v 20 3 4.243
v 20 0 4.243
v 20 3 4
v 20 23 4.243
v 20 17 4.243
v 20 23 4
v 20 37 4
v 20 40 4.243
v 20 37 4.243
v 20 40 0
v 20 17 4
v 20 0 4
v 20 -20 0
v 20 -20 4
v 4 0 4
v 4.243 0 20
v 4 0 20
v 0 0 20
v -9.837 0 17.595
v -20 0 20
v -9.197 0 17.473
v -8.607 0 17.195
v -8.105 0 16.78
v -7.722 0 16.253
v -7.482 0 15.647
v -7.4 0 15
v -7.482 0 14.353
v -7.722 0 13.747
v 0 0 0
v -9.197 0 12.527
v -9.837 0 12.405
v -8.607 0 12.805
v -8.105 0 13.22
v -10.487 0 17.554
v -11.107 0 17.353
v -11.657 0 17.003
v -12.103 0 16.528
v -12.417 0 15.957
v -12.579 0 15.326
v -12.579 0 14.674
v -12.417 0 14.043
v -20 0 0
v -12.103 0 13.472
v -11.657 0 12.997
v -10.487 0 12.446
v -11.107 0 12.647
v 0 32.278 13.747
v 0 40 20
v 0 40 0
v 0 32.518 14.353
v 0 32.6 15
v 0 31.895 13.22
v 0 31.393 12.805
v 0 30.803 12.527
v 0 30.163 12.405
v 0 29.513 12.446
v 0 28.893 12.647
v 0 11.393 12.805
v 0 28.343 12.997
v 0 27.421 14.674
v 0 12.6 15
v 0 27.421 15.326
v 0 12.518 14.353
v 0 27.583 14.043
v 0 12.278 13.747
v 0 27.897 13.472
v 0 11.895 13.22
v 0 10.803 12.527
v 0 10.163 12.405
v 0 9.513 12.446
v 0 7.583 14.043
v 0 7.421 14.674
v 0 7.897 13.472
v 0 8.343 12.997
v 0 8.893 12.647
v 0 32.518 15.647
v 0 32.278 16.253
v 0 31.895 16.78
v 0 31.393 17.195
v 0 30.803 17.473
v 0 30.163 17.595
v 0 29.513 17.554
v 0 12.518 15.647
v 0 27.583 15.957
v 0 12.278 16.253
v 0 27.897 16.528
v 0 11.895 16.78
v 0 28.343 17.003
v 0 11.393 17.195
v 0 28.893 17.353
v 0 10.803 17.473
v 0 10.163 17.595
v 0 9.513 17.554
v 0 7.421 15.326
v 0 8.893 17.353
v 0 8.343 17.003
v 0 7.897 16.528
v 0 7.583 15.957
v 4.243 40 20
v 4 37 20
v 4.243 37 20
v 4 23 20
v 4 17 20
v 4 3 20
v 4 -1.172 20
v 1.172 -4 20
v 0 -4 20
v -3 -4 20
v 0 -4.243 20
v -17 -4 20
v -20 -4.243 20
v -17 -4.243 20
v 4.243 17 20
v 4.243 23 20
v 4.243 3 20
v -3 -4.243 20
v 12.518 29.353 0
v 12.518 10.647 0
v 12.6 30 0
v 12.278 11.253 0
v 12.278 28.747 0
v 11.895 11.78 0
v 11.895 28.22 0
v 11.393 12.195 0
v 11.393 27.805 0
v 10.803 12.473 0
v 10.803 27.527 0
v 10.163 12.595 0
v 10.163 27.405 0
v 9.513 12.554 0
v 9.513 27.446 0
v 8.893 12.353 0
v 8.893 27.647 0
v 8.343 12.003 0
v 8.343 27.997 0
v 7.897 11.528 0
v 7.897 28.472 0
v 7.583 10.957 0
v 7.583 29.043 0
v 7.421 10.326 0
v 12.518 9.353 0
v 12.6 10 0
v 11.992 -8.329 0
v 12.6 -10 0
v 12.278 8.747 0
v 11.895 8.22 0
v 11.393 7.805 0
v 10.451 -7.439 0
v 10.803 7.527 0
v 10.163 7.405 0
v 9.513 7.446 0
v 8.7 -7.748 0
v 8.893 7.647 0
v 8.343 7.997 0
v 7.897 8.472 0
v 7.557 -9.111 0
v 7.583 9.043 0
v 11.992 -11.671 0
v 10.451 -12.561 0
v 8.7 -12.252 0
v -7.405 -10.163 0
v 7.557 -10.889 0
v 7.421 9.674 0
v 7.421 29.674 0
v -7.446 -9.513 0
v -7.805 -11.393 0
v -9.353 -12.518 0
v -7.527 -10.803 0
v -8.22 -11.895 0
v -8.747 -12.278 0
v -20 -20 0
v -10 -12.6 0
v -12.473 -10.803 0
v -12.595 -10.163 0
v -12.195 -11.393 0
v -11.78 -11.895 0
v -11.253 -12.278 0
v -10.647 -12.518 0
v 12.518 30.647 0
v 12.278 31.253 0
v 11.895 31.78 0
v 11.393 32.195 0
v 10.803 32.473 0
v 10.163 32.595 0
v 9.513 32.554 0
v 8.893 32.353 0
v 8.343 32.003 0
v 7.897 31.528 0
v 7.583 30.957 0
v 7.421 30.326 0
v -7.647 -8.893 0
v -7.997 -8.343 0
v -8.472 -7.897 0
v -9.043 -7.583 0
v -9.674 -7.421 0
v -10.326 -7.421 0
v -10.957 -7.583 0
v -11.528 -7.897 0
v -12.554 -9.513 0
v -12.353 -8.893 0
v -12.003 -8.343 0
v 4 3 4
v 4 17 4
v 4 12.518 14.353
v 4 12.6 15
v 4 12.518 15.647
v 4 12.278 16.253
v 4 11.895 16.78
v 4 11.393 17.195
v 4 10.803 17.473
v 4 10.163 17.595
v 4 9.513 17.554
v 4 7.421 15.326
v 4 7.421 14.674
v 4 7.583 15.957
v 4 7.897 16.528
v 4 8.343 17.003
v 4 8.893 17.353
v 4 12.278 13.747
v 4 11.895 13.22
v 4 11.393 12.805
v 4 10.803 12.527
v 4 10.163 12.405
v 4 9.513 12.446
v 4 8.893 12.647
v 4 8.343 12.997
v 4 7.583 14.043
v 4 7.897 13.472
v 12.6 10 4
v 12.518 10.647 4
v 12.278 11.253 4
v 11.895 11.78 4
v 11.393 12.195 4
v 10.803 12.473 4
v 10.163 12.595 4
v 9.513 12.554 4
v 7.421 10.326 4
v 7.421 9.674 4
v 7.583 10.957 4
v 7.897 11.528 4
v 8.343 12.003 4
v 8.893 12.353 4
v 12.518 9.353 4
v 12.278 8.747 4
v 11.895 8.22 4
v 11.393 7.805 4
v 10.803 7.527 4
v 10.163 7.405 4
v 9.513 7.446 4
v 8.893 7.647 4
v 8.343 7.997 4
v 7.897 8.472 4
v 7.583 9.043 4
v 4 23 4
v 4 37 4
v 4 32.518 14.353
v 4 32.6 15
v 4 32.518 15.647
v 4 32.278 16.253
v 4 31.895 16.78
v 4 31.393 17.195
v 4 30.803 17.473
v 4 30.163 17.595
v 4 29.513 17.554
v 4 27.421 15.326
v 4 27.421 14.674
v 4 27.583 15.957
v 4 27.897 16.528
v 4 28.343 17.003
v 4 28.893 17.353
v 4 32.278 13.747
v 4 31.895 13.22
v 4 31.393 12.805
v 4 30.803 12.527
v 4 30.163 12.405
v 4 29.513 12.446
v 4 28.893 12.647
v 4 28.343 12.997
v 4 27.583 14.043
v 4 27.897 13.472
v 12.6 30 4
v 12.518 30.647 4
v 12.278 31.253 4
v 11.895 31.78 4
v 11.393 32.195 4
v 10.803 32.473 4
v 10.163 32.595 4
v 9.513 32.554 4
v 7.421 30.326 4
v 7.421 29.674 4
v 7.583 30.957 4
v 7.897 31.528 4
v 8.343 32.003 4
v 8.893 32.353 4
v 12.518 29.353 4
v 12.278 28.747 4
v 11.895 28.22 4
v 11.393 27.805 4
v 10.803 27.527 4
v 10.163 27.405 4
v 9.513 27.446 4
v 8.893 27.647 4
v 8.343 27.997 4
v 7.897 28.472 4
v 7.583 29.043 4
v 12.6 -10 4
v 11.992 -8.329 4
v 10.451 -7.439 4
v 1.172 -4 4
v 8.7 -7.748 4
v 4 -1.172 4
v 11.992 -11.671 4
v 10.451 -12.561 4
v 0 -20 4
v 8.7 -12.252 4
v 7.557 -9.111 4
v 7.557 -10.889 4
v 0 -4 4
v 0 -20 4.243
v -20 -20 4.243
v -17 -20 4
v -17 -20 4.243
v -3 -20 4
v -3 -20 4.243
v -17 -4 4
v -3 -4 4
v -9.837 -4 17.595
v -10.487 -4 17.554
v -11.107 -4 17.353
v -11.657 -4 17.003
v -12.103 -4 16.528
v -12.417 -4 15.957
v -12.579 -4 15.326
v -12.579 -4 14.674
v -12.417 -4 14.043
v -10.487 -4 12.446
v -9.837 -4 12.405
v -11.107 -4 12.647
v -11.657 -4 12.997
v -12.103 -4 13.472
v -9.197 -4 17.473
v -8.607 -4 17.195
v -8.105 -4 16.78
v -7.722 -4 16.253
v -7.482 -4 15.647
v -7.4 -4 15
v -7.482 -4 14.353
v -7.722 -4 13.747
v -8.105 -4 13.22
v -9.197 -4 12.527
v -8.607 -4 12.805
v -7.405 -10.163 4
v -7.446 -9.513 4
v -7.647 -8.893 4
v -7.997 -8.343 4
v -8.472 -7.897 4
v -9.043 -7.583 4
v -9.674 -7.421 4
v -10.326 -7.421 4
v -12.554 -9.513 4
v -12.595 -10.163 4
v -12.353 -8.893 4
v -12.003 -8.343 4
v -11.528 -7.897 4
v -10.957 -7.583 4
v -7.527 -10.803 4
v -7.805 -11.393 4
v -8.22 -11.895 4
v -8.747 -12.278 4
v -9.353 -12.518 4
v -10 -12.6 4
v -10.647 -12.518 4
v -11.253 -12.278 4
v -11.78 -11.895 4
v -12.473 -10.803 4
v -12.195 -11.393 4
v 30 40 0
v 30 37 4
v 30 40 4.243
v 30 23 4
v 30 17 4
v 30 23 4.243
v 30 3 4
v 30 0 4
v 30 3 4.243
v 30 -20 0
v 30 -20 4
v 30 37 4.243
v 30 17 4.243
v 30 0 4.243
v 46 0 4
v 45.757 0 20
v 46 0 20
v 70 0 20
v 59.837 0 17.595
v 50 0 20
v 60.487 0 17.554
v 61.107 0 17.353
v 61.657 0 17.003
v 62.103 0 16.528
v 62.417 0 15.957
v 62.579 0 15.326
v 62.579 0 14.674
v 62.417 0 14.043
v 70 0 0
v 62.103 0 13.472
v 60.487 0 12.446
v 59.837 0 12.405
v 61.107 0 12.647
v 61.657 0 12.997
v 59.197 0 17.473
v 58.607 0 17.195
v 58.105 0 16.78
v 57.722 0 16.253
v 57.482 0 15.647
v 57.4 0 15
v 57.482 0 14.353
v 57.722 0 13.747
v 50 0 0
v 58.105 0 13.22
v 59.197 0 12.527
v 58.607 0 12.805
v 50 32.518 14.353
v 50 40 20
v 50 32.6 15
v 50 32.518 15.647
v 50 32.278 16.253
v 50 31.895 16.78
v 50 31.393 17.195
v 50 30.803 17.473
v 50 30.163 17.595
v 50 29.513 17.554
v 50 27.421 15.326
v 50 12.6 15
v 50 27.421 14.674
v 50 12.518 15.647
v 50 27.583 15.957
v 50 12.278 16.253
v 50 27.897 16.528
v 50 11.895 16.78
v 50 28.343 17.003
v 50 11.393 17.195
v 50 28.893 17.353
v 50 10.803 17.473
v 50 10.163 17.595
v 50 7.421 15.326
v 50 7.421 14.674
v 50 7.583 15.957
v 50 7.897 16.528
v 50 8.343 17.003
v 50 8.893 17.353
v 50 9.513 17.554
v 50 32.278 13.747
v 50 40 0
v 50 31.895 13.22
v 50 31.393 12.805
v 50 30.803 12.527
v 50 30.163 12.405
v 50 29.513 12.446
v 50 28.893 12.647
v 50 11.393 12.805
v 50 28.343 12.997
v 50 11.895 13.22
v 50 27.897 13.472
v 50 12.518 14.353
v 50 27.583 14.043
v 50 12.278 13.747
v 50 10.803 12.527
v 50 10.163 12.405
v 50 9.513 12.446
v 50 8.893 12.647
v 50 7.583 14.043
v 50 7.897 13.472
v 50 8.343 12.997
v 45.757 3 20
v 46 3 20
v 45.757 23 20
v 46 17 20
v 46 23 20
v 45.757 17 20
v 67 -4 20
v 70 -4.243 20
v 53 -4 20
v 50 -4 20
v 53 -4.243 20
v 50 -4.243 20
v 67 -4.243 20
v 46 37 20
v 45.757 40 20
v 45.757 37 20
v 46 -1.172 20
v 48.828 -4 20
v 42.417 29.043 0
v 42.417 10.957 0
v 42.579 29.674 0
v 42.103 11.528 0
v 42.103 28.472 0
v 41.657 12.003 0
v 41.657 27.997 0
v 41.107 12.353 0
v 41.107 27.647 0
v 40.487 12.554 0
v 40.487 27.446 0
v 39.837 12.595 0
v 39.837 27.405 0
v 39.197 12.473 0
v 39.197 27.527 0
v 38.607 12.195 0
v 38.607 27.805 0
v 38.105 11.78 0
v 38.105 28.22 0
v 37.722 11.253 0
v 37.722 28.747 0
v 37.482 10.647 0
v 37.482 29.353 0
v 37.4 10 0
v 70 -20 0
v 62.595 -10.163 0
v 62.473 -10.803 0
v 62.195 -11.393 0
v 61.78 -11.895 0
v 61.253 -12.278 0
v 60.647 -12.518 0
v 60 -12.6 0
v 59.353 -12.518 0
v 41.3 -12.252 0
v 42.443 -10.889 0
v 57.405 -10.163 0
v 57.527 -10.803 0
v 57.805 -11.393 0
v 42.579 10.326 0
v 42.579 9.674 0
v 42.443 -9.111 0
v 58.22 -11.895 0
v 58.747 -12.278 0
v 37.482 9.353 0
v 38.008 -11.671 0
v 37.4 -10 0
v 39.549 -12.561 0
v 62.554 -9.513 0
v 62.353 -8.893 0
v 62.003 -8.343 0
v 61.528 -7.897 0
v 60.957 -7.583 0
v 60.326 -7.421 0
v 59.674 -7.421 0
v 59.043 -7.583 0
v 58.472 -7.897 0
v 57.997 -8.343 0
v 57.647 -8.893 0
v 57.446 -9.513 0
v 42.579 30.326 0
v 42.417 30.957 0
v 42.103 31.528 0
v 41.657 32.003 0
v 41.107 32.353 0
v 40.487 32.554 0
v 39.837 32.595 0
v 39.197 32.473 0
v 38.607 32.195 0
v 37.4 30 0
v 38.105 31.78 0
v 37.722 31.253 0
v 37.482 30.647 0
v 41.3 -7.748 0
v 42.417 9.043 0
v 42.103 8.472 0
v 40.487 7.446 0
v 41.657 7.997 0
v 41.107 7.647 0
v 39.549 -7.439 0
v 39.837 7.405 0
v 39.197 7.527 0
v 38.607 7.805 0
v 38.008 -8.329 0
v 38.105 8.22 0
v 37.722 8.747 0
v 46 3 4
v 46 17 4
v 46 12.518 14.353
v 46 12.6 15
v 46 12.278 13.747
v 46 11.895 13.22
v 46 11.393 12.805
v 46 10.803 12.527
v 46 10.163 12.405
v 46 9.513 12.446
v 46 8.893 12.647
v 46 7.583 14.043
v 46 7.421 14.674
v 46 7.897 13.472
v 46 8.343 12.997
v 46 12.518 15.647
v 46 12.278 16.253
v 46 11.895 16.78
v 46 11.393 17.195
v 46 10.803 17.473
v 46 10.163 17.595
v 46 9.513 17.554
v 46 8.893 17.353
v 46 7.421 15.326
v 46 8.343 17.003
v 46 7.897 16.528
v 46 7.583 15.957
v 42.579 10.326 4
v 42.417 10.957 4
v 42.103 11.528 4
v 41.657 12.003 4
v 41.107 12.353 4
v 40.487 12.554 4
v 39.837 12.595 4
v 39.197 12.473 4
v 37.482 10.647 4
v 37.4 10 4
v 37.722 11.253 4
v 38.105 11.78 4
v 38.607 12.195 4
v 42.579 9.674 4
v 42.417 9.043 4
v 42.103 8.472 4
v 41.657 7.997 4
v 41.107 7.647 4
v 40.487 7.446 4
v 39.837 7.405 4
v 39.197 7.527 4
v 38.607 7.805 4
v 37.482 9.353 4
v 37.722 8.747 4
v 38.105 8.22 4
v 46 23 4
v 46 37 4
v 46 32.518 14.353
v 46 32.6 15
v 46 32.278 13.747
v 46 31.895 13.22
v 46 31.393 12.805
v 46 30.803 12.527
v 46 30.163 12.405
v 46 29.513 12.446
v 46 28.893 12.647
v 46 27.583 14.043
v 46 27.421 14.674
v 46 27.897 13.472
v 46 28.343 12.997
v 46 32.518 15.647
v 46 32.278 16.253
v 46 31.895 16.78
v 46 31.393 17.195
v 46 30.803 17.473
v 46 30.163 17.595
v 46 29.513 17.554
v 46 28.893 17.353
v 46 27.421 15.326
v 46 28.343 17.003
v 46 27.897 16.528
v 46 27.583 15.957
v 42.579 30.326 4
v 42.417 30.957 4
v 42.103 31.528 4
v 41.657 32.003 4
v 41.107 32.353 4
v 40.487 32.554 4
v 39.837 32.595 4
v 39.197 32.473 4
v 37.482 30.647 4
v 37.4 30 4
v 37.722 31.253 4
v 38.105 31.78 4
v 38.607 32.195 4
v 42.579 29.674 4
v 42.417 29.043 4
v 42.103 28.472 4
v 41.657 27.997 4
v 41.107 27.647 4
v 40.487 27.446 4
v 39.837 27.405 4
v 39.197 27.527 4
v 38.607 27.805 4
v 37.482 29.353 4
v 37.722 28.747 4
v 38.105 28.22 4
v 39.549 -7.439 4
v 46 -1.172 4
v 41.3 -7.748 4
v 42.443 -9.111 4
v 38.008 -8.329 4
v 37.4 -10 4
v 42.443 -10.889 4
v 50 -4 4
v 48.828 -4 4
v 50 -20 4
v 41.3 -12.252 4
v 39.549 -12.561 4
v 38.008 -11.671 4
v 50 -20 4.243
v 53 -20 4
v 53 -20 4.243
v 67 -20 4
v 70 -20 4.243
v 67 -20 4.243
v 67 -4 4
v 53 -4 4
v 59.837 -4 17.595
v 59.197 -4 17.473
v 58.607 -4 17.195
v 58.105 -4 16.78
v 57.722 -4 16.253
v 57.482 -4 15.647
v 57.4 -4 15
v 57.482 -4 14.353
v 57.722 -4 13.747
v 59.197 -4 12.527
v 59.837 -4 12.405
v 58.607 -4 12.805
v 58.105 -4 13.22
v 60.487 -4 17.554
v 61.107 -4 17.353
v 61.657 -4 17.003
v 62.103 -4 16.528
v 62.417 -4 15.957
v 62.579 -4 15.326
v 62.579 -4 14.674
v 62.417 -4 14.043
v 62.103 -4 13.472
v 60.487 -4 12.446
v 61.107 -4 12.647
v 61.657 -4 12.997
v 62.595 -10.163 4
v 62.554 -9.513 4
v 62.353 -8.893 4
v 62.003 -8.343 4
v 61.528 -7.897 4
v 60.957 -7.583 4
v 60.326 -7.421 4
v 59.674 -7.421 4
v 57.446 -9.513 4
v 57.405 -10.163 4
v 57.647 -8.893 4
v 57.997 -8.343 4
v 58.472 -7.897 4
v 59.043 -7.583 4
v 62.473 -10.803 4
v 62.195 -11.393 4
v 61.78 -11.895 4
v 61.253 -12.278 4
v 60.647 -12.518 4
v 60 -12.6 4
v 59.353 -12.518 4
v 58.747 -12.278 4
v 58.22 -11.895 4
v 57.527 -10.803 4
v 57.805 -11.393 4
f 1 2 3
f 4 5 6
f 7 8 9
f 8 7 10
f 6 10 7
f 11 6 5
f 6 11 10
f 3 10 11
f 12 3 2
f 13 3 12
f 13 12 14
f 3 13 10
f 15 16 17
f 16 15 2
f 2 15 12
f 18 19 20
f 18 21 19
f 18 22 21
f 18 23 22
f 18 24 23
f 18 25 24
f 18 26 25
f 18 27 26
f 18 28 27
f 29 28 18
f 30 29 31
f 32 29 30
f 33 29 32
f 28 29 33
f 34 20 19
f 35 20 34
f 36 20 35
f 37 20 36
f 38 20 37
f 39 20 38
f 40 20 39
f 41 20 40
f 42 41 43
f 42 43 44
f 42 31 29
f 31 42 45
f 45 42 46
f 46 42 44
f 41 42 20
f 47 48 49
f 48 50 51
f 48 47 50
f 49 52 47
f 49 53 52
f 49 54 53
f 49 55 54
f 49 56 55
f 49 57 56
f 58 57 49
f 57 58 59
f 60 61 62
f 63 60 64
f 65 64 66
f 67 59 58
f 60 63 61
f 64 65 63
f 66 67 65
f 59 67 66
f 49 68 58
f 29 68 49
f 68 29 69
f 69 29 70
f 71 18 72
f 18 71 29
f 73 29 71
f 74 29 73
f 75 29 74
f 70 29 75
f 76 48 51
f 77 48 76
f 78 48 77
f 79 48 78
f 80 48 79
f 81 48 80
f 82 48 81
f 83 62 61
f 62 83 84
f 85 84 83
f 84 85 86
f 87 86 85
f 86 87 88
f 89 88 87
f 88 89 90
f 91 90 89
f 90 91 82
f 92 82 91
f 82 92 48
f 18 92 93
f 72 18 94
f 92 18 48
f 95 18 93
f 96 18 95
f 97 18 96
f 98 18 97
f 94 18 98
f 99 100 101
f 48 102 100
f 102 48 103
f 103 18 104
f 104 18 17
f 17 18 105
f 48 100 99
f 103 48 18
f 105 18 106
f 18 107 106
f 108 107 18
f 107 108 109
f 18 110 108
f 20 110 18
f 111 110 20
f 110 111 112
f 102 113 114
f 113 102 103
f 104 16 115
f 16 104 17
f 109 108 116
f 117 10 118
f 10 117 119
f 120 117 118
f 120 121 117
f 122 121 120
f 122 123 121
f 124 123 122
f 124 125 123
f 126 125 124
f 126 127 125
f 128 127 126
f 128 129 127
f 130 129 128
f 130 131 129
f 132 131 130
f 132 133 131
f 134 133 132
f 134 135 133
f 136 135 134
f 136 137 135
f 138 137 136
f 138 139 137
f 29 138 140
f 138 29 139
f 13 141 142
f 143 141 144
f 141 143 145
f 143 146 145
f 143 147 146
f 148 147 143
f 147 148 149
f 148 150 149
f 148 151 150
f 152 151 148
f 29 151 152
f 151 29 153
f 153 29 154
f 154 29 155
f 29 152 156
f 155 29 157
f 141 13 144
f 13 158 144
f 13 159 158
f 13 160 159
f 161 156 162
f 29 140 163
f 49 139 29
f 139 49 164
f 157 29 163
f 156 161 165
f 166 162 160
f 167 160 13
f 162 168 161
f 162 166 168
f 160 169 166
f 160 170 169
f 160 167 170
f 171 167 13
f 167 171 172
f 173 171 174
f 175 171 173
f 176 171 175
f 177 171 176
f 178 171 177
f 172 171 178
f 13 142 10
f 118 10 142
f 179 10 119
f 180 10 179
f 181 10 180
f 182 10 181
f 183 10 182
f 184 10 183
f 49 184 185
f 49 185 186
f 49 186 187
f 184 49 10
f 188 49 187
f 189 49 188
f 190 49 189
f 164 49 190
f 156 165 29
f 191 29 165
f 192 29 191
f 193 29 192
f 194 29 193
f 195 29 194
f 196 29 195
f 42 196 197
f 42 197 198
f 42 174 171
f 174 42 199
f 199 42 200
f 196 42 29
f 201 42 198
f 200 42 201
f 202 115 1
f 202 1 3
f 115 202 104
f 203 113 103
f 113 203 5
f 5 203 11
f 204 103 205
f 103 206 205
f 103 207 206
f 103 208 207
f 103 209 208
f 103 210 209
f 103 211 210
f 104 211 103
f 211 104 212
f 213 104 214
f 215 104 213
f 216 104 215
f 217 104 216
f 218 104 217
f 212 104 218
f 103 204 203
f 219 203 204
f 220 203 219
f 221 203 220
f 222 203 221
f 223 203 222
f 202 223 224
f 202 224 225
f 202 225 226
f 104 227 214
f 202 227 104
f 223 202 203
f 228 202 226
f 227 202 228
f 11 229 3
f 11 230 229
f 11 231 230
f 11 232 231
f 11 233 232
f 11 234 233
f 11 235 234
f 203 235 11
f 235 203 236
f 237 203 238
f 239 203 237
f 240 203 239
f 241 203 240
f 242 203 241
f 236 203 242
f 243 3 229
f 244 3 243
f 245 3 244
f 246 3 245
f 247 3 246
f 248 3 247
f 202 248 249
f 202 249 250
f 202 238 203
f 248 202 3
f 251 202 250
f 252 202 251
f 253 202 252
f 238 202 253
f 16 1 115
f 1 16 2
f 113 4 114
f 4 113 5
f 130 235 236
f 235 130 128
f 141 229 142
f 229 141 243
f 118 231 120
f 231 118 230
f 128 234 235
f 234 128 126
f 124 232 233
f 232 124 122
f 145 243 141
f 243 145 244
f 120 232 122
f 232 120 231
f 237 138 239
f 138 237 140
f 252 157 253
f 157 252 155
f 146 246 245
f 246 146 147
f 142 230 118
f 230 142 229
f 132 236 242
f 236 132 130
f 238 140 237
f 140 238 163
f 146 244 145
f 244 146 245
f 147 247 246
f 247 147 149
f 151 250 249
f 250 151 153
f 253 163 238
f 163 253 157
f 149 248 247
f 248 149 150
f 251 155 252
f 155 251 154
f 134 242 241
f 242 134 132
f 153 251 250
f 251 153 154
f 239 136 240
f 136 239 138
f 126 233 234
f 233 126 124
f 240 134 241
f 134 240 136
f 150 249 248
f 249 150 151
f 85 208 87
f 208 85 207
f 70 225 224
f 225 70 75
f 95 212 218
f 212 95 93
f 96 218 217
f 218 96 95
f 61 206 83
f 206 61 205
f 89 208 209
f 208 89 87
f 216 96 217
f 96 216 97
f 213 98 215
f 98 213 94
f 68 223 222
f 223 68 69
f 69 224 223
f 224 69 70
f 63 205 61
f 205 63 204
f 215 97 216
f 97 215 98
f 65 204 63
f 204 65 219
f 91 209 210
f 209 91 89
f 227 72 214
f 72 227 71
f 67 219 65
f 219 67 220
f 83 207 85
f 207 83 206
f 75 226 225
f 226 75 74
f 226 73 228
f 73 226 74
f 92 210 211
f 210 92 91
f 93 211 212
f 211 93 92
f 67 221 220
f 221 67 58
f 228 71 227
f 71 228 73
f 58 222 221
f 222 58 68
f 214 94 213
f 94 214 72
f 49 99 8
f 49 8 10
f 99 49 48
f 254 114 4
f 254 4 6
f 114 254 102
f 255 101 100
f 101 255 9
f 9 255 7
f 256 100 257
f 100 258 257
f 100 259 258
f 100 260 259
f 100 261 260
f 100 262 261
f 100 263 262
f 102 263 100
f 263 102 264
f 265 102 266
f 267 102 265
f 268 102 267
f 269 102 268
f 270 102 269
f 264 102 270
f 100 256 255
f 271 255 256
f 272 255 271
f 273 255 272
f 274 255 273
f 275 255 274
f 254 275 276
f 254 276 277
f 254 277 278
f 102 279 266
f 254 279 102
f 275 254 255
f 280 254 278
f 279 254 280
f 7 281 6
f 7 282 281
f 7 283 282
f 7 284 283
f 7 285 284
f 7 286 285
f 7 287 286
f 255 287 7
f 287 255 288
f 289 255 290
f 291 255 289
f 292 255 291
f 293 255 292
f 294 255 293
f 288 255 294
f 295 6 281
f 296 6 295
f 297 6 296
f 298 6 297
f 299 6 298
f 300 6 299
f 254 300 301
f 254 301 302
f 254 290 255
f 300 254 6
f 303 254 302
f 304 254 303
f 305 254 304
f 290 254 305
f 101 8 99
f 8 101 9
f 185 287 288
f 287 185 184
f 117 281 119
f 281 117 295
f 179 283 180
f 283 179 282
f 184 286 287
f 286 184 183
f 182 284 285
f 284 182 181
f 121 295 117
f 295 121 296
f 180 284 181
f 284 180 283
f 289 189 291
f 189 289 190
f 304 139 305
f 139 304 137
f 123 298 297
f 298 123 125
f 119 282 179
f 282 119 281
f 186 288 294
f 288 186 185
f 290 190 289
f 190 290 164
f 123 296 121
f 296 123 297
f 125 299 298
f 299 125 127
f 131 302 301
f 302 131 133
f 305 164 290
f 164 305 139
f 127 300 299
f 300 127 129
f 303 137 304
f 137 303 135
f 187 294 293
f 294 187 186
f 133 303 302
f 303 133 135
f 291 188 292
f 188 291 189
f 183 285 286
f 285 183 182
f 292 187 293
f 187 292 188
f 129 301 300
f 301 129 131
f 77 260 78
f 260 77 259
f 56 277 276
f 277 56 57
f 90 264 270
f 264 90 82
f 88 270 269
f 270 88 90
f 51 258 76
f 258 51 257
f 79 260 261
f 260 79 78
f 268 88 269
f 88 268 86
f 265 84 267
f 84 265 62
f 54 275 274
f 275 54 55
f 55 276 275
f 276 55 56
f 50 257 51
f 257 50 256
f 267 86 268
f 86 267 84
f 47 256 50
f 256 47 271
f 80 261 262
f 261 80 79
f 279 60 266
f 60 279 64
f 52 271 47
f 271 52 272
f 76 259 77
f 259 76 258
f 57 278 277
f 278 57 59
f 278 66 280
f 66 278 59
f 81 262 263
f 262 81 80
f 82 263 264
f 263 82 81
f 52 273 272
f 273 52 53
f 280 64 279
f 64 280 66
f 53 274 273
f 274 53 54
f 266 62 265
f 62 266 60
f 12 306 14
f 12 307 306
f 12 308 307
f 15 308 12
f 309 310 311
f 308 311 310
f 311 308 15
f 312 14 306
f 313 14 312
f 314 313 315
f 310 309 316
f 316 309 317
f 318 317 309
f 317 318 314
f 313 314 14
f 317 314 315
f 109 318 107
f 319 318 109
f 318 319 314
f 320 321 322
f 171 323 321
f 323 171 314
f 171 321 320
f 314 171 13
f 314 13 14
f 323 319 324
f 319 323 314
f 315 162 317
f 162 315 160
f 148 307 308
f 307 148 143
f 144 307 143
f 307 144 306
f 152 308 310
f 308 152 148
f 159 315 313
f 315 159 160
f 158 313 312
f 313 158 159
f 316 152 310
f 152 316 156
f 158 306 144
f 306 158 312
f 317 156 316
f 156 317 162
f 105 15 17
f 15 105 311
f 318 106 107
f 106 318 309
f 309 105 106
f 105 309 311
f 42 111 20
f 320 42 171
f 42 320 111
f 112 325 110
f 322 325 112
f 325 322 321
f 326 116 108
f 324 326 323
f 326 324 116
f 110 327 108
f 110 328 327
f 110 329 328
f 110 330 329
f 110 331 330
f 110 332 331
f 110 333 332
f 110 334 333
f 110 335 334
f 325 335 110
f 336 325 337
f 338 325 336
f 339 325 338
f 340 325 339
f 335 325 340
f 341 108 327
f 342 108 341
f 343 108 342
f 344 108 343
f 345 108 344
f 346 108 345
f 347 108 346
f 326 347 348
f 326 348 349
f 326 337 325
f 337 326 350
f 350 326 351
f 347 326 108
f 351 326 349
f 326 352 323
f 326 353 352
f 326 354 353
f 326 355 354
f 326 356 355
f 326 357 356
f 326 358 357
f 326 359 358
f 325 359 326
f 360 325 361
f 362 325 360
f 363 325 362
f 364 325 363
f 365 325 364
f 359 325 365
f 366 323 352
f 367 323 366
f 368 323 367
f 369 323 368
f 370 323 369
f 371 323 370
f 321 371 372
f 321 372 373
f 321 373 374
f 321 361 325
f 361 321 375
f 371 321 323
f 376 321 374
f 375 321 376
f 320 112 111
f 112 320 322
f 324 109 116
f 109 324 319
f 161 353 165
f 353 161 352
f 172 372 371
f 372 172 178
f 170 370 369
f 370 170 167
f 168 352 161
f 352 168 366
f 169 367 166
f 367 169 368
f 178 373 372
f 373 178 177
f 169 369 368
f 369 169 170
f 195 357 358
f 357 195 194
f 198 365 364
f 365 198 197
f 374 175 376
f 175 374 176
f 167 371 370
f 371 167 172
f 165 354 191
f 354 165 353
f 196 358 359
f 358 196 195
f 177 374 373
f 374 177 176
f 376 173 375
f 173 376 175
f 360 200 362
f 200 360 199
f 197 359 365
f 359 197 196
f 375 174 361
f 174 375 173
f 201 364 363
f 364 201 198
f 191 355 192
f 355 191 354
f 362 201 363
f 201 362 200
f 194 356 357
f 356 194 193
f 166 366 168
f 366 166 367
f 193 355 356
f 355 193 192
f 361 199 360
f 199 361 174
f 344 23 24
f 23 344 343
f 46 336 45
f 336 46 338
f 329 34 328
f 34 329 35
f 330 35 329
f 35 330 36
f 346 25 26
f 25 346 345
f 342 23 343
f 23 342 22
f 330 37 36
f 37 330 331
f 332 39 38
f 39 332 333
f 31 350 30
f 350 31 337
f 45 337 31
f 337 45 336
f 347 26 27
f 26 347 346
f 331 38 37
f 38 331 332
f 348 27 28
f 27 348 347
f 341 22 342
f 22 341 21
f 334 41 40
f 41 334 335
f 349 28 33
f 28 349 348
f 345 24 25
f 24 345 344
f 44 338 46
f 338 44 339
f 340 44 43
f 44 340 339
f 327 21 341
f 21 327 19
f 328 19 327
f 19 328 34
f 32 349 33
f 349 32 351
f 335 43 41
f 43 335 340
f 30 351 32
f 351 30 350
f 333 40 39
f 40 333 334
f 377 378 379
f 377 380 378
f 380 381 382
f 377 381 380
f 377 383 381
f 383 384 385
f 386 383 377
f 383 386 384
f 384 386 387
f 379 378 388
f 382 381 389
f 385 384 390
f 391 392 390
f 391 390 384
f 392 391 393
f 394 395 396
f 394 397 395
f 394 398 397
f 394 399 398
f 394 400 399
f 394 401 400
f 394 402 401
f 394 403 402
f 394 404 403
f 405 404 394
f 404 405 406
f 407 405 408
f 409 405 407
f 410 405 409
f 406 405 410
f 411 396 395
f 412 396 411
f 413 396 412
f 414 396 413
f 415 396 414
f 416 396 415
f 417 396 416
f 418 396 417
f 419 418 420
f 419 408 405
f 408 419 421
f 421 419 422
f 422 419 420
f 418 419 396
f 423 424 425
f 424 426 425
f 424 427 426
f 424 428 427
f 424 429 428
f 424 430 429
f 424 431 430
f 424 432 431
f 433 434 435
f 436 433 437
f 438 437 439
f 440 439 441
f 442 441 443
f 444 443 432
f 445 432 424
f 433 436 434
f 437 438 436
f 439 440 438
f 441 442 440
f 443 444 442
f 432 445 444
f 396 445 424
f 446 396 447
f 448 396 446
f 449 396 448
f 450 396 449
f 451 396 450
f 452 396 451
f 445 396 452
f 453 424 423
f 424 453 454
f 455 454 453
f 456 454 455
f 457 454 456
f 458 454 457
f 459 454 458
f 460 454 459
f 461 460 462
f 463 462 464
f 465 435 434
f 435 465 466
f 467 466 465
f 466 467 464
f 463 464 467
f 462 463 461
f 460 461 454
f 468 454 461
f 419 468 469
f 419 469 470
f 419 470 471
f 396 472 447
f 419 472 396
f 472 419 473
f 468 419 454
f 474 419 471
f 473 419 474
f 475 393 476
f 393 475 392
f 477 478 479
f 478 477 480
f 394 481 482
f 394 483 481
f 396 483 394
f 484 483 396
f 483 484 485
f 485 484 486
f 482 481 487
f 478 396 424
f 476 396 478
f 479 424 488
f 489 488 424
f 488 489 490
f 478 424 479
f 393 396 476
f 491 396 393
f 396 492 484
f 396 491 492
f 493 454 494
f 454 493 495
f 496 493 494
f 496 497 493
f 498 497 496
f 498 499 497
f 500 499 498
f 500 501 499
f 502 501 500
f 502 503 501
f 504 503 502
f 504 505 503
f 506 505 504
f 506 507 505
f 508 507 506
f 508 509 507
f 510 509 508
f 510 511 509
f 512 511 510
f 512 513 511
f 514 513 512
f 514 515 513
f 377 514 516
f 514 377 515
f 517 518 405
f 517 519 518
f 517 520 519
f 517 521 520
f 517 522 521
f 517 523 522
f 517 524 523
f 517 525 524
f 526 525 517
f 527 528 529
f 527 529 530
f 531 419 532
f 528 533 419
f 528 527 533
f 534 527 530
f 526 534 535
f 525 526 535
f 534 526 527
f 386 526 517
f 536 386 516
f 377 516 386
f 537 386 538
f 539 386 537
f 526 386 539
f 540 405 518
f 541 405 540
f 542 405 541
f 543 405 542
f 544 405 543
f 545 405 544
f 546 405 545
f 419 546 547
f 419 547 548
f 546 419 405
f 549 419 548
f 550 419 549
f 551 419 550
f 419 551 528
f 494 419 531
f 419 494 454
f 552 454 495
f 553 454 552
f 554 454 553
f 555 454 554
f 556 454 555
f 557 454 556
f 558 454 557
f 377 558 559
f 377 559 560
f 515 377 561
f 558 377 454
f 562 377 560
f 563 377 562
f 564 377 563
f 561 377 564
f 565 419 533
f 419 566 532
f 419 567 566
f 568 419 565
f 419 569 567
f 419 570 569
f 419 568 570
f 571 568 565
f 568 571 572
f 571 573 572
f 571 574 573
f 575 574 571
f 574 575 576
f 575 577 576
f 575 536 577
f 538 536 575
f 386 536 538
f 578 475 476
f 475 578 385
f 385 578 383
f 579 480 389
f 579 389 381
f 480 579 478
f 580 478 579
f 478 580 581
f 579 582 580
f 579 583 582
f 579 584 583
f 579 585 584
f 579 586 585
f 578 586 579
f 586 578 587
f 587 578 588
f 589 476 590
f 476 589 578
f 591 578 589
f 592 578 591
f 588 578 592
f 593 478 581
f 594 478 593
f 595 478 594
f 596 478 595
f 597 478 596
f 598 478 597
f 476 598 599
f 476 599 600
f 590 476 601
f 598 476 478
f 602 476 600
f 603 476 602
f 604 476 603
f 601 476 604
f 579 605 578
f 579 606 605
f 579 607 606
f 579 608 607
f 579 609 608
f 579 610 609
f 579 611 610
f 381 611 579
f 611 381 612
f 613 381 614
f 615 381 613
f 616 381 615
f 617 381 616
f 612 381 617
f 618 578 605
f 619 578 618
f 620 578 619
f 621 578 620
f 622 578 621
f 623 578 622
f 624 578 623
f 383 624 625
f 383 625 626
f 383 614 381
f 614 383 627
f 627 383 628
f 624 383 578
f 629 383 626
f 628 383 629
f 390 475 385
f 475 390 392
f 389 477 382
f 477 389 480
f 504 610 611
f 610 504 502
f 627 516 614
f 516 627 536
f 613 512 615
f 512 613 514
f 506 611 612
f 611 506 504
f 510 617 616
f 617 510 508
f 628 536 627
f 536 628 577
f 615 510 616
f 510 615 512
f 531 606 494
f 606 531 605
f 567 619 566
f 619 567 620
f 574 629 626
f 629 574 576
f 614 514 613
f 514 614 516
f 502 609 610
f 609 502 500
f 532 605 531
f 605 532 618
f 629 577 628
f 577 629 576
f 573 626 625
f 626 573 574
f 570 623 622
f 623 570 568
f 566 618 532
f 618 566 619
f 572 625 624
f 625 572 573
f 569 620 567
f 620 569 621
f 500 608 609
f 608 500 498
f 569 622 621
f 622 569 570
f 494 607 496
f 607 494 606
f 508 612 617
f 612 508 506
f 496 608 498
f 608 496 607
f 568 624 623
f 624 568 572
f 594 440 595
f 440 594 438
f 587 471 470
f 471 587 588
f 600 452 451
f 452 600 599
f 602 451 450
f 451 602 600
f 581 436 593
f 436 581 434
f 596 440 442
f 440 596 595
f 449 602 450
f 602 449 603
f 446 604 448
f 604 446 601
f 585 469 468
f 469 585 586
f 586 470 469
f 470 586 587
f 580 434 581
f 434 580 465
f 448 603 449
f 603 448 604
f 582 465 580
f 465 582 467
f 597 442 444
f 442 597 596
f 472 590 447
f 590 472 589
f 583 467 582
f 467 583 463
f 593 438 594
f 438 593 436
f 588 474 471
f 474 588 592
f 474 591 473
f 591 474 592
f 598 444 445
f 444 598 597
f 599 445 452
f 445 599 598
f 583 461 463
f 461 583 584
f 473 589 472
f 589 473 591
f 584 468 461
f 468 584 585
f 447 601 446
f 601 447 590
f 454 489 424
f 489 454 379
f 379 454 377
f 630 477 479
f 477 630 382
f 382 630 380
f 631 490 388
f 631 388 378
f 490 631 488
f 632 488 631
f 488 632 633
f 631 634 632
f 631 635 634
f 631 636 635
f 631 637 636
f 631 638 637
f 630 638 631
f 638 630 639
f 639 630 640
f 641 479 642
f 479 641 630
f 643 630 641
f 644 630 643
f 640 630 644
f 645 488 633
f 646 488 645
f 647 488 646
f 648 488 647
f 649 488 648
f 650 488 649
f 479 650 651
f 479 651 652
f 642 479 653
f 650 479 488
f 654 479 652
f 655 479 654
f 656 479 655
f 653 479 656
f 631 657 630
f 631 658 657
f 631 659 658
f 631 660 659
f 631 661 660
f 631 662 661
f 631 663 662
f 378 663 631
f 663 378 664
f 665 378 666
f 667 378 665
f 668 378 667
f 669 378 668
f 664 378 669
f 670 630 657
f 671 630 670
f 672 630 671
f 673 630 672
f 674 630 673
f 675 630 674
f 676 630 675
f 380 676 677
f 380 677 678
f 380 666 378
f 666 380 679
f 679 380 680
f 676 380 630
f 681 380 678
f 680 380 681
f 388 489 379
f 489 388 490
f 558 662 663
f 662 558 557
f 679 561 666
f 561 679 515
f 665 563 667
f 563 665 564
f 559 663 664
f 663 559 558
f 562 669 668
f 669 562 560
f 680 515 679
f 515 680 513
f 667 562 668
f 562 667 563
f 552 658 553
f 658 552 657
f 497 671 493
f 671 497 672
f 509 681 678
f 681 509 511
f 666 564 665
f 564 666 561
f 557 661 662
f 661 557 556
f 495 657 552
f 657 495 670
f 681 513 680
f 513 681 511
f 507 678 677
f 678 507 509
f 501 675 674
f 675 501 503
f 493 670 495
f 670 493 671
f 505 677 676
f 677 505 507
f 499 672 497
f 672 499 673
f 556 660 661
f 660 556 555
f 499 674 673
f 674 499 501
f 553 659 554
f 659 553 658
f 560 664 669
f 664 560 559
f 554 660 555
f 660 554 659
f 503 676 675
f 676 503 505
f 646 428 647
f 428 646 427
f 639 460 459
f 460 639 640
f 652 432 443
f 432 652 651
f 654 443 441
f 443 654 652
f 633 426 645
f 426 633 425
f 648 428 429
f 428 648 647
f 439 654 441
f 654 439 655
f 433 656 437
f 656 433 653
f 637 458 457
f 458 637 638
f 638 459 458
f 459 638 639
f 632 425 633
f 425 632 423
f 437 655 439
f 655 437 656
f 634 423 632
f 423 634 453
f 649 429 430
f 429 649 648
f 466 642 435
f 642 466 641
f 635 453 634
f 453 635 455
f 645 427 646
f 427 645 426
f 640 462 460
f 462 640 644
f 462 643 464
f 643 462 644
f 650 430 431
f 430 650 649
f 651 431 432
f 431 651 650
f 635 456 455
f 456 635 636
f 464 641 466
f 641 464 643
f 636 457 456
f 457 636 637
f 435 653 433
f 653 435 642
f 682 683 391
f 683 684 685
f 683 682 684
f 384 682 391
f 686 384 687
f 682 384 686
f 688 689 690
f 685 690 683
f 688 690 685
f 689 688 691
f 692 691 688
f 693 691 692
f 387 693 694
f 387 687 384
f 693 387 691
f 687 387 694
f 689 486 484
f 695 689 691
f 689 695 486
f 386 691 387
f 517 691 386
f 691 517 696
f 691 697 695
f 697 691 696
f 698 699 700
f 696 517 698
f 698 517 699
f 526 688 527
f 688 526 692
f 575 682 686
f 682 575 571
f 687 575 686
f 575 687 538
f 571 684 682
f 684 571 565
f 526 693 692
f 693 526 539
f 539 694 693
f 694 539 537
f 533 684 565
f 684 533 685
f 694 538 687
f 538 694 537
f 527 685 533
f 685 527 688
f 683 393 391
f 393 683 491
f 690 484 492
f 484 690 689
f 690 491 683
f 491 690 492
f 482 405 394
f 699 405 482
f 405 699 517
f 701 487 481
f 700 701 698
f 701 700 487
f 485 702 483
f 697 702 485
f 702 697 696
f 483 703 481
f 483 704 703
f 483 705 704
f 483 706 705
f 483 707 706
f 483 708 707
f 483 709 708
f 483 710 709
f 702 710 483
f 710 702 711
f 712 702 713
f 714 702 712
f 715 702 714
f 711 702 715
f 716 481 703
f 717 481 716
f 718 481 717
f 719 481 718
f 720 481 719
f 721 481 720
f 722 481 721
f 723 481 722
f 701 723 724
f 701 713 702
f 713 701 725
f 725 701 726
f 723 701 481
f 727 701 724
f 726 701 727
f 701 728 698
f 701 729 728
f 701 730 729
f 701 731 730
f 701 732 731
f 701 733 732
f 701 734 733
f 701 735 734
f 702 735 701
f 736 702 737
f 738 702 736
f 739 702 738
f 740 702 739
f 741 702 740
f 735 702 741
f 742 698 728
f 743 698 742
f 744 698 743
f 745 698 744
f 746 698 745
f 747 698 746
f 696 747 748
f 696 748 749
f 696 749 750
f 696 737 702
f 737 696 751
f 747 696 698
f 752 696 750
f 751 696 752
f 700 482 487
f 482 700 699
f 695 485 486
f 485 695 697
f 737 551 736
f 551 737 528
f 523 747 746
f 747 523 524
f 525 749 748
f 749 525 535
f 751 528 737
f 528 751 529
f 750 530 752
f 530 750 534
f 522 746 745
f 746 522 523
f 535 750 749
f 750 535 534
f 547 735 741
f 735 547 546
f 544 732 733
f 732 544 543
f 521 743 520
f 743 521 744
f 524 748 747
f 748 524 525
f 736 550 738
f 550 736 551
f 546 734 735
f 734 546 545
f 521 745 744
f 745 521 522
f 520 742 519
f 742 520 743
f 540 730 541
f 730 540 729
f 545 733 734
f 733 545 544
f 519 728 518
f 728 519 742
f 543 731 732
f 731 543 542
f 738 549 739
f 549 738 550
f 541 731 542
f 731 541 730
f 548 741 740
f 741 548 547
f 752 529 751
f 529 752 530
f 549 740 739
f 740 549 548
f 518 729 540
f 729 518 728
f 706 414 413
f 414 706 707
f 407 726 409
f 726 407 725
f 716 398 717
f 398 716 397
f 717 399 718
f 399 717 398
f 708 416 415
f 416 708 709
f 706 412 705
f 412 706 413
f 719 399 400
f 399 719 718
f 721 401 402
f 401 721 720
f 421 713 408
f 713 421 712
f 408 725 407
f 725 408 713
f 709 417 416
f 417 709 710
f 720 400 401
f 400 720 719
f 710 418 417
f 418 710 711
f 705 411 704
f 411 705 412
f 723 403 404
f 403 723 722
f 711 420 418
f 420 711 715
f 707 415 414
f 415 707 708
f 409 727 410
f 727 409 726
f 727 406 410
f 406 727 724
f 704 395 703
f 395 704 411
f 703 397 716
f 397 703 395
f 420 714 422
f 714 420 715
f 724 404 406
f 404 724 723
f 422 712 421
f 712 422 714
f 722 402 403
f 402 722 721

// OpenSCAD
// file: Cubo.scad
// -----------------
// module cubo
// GPL v2.0
// yvoz.lg@gmail.com
// -----------------


// exemples ----

cubo([10,10,5], [1,2,3,4,5,6,7,8,9,10,11,12], 1.5);

translate([15, 0, 0]){
	difference(){
		cubo([10,20,5], [2,3], 3);
		translate([5,10,-1]) cylinder(r=2, h=7, $fn=12);
	}
}

translate([-15, 0, 0]){
	difference(){
		cube([10,20,15]);
		translate([3,3,3]) cubo([10,20,50], [1,5], 3);
	}
}

// ------------

module cubo(dim, cro, a){

	diago = sqrt(pow(a,2)+pow(a,2));
	difference(){
		cube(dim);
		
		for(i=cro){
			//x
			if(i==1){
				translate([-1, 0, -diago/2])
				rotate([45, 0, 0])
				cube([dim.x+2, a, a]);
			}
			if(i==2){
				translate([-1, 0, dim.z-diago/2])
				rotate([45, 0, 0])
				cube([dim.x+2, a, a]);
			}
			if(i==3){
				translate([-1, dim.y, dim.z-diago/2])
				rotate([45, 0, 0])
				cube([dim.x+2, a, a]);
			}
			if(i==4){
				translate([-1, dim.y, -diago/2])
				rotate([45, 0, 0])
				cube([dim.x+2, a, a]);
			}
			//y
			if(i==5){
				translate([-diago/2, -1, 0])
				rotate([0, 45, 0])
				cube([a, dim.y+2, a]);
			}
			if(i==6){
				translate([dim.x-diago/2, -1, 0])
				rotate([0, 45, 0])
				cube([a, dim.y+2, a]);
			}
			if(i==7){
				translate([dim.x-diago/2, -1, dim.z])
				rotate([0, 45, 0])
				cube([a, dim.y+2, a]);
			}
			if(i==8){
				translate([-diago/2, -1, dim.z])
				rotate([0, 45, 0])
				cube([a, dim.y+2, a]);
			}
			//z
			if(i==9){
				translate([0, -diago/2, -1])
				rotate([0, 0, 45])
				cube([a, a, dim.z+2]);
			}
			if(i==10){
				translate([0, dim.y-diago/2, -1])
				rotate([0, 0, 45])
				cube([a, a, dim.z+2]);
			}
			if(i==11){
				translate([dim.x, dim.y-diago/2, -1])
				rotate([0, 0, 45])
				cube([a, a, dim.z+2]);
			}
			if(i==12){
				translate([dim.x, -diago/2, -1])
				rotate([0, 0, 45])
				cube([a, a, dim.z+2]);
			}
		}
	}
}
// main file
module 90BracketMin(){

// 90 degree bracket
// modifié par X. HINAULT - www.mon-club-elec.fr

$fn = 25;
length = 20;
width = 20;
walls = 3;

rHole = 2.6;

rotate([90, 0, 0])
difference()
{
    cube([length, length, width], center=true);
    
    translate([4, 4, 0])
    cube([length, length, width-(walls * 2)], center=true);
    
    rotate([0,0,45])
    translate([length/2 + 3, 0, 0])
    cube([length, length + 20, width+2], center= true);

    translate([0, -1, 0]) rotate([90, 0, 0]) #cylinder(r=rHole, h=10);

    //translate([-length/2 - 5, -length/2 + 16, 0])
    //rotate([0, 90, 0])
    //#cylinder(r=rHole, h=10);
	
	translate([-length/2 - 5, -length/2 + 15, 0]) rotate([0, 90, 0]) cylinder(r=rHole, h=10);
	
}

} // fin module 

lx = 20;
ly = 20;
lz = lx;
j = 0.2;
ep = 4;

rHole = 2.6;

use<Cubo.scad>;

module bracket_2x1(){
	translate([0,0,0]) translate([lx/2, ly/2, lx/2]) 90BracketMin();
	translate([0,20,0]) translate([lx/2, ly/2, lx/2]) 90BracketMin();
	difference(){
		translate([0,-lx,0]) cube([lx,lx,ep]);
		 translate([lx/2, -ly/2, -1]) rotate([0,0, 0]) cylinder(r=rHole, h=10);
	}
	translate([0,-ep,0]) cubo([ep,ep,lz], [12], ep);
	translate([-ly,0,0]) rotate([0,0,-90]) translate([lx/2, ly/2, lx/2]) 90BracketMin();
}

bracket_2x1();
translate([50,0,0]) mirror([1,0,0]) bracket_2x1();
